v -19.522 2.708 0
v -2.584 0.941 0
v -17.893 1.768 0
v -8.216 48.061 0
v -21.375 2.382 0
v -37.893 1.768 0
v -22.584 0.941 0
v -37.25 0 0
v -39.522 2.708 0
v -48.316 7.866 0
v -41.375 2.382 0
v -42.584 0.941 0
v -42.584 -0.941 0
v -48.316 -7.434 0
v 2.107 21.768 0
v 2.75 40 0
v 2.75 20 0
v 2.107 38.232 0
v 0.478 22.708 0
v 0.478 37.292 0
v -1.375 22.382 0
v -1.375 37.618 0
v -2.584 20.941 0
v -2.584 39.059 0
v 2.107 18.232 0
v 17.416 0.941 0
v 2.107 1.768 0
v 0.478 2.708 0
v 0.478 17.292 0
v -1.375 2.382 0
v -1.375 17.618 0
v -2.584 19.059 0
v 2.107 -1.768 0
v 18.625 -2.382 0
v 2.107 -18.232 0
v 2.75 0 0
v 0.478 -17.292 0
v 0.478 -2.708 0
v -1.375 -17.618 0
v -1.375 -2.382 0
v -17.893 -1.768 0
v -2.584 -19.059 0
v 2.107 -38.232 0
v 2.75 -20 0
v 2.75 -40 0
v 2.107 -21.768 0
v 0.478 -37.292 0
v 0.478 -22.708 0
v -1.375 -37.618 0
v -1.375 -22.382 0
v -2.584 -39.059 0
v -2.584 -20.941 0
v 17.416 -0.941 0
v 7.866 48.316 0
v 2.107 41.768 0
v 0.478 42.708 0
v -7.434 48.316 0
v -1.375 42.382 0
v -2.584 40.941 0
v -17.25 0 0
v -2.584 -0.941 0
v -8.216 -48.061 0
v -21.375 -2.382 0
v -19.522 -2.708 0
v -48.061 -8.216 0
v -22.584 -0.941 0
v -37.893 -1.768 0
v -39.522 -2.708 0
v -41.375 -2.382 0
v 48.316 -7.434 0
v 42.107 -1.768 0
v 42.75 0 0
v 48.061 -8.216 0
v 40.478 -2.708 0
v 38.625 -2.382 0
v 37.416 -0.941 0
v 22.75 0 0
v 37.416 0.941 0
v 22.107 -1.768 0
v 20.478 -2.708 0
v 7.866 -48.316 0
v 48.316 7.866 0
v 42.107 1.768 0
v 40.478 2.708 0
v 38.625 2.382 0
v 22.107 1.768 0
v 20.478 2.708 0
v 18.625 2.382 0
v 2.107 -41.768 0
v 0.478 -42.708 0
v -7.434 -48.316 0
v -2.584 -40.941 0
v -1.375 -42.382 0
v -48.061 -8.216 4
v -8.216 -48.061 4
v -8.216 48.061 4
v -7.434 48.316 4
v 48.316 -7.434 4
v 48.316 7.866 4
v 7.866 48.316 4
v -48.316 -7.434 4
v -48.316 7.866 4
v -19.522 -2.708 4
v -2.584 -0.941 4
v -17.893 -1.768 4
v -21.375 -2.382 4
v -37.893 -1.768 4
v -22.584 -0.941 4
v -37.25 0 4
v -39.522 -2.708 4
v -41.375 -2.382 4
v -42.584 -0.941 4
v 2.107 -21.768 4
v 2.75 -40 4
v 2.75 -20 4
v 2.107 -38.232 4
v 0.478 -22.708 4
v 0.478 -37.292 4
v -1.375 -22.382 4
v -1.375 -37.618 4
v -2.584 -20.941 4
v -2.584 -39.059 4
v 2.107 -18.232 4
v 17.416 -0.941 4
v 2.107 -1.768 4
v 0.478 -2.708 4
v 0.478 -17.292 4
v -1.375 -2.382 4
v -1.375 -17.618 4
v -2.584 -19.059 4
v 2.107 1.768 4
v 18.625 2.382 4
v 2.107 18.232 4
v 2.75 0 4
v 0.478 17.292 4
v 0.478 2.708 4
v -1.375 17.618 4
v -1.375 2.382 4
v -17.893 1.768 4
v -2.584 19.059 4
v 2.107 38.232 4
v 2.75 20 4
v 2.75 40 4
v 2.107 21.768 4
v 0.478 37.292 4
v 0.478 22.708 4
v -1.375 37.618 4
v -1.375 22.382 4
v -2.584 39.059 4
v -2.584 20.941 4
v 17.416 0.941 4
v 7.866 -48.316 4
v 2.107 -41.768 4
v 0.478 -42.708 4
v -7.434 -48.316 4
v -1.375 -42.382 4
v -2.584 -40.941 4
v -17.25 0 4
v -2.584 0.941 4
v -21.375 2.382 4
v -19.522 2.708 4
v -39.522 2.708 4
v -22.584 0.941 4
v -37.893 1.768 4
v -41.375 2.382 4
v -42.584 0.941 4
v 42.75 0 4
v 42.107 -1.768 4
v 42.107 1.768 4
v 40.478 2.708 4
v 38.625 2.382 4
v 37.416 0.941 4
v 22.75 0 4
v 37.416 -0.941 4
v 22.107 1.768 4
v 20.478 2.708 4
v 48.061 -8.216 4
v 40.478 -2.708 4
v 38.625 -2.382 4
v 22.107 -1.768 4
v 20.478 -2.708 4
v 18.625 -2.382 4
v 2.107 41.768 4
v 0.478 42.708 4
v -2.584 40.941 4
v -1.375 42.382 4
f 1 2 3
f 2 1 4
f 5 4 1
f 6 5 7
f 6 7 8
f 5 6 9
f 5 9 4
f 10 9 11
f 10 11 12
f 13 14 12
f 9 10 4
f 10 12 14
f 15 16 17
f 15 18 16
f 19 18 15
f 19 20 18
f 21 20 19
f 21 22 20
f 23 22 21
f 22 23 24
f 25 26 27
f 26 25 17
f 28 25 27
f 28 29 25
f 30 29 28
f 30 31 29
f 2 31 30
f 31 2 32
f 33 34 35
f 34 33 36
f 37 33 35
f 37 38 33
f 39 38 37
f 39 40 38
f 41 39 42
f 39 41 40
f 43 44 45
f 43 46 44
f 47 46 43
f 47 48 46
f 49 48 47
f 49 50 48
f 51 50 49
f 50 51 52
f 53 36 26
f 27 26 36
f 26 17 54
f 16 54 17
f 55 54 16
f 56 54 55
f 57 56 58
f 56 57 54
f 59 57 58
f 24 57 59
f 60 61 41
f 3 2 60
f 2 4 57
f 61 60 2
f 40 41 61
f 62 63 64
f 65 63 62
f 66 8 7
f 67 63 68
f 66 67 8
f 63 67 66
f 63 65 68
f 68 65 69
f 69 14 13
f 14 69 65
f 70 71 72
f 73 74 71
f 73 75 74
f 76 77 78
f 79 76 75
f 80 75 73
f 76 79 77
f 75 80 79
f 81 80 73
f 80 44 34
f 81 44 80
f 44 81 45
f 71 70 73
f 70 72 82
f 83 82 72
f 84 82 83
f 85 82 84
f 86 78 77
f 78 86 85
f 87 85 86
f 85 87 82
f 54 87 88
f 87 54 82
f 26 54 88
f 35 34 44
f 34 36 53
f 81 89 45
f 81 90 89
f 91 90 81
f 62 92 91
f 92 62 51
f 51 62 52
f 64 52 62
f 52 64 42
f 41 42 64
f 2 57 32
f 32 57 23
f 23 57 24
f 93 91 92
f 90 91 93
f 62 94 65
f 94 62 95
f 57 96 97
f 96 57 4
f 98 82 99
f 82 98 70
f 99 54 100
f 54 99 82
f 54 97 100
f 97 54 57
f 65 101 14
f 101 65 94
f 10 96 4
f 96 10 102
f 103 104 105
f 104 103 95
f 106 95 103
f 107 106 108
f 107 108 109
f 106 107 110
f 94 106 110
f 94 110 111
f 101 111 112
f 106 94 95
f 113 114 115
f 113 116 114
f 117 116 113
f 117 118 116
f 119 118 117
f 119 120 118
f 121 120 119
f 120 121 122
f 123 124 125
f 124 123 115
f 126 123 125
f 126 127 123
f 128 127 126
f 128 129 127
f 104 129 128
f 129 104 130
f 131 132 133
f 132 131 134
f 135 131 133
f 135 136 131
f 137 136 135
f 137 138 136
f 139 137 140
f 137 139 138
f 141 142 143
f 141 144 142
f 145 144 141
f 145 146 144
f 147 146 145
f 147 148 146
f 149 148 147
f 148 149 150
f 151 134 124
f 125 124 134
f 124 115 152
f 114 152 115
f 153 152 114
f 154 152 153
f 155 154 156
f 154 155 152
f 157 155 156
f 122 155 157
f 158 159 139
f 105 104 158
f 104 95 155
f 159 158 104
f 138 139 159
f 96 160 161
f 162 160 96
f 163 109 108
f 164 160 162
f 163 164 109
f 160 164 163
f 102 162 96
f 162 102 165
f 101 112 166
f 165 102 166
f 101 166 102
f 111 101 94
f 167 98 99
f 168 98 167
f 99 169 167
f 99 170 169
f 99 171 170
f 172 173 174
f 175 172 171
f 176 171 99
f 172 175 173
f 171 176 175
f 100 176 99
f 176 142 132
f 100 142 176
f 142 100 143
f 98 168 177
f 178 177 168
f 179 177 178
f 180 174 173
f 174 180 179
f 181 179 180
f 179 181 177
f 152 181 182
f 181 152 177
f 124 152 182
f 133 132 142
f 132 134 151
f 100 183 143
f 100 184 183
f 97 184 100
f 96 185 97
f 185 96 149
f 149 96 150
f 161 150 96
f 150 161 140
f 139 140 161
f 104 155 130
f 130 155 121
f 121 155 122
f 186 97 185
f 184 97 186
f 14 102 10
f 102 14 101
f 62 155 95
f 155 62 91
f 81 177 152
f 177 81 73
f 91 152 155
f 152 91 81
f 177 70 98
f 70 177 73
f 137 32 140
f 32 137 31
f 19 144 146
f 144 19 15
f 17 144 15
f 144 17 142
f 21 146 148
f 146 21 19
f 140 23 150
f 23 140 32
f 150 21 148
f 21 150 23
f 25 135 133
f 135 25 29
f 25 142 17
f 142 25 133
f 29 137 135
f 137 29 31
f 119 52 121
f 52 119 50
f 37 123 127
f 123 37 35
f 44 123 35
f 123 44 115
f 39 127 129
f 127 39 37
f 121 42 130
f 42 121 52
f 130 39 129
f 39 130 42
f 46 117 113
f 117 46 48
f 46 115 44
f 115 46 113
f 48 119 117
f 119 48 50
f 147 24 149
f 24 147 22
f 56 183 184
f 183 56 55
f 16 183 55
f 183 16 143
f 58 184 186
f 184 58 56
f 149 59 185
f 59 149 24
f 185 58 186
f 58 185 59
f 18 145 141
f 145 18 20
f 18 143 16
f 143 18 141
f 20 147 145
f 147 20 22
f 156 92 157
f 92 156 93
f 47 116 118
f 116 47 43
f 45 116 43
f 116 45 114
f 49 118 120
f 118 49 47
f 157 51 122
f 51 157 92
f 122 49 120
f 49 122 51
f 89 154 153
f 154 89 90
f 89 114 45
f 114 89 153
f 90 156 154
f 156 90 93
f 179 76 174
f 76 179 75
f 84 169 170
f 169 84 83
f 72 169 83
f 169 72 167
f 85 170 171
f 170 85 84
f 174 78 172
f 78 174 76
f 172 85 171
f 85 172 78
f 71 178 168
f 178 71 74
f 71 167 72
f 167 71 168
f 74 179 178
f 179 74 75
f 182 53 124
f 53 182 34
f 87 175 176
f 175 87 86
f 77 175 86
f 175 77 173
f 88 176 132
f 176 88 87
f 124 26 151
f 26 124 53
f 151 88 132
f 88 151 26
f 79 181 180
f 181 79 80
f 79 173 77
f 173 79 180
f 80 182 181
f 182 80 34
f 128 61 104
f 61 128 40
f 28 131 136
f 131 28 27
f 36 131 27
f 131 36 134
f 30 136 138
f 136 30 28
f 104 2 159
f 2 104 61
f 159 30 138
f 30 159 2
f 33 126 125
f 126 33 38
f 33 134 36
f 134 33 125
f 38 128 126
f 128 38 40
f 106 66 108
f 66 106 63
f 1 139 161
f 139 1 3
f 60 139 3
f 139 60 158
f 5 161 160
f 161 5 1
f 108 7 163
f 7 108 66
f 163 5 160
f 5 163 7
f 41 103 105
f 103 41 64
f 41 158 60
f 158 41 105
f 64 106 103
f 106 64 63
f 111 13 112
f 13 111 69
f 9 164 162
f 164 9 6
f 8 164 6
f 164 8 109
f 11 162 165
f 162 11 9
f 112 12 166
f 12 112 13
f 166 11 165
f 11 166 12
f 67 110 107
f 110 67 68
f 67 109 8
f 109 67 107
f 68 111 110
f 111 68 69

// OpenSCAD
// rob@openpart.co.uk 20140202-23:00
// 9 hole cross joining plate for 20mm NOMINAL extrusion
// V-Slot & others

module roundedRect(size, radius)
{
	x = size[0];
	y = size[1];
	z = size[2];
	linear_extrude(height=z)
	hull()
	{
		// place 4 circles in the corners, with the given radius
		translate([(-x/2)+(radius/2), (-y/2)+(radius/2), 0])
		circle(r=radius);
		translate([(x/2)-(radius/2), (-y/2)+(radius/2), 0])
		circle(r=radius);
		translate([(-x/2)+(radius/2), (y/2)-(radius/2), 0])
		circle(r=radius);
		translate([(x/2)-(radius/2), (y/2)-(radius/2), 0])
		circle(r=radius);
	}
}

hole = 5.5 / 2;
plate_width1 = 96;
plate_width2 = 96;
plate_length = 16;
plate_thickness = 4;
extend_past_thickness = 2;
corner_radius = 0.7;
difference () {
hull () {
	translate([0, 0, 0])
		roundedRect ([plate_length, plate_width1, plate_thickness], corner_radius);
	rotate (90,0,0) {

	translate([0, 0, 0])
		roundedRect ([plate_length, plate_width2, plate_thickness], corner_radius);
}}

	translate([0,20,-1])
		cylinder(h = (extend_past_thickness+plate_thickness+2), r = hole);
	translate([0,-20,-1])
		cylinder(h = (extend_past_thickness+plate_thickness+2), r = hole);

	translate([0,40,-1])
		cylinder(h = (extend_past_thickness+plate_thickness+2), r = hole);
	translate([0,-40,-1])
		cylinder(h = (extend_past_thickness+plate_thickness+2), r = hole);

	translate([40,0,-1])
		cylinder(h = (extend_past_thickness+plate_thickness+2), r = hole);
	translate([20,0,-1])
		cylinder(h = (extend_past_thickness+plate_thickness+2), r = hole);
	translate([0,0,-1])
		cylinder(h = (extend_past_thickness+plate_thickness+2), r = hole);
	translate([-20,0,-1])
		cylinder(h = (extend_past_thickness+plate_thickness+2), r = hole);
	translate([-40,0,-1])
		cylinder(h = (extend_past_thickness+plate_thickness+2), r = hole);

}
	
